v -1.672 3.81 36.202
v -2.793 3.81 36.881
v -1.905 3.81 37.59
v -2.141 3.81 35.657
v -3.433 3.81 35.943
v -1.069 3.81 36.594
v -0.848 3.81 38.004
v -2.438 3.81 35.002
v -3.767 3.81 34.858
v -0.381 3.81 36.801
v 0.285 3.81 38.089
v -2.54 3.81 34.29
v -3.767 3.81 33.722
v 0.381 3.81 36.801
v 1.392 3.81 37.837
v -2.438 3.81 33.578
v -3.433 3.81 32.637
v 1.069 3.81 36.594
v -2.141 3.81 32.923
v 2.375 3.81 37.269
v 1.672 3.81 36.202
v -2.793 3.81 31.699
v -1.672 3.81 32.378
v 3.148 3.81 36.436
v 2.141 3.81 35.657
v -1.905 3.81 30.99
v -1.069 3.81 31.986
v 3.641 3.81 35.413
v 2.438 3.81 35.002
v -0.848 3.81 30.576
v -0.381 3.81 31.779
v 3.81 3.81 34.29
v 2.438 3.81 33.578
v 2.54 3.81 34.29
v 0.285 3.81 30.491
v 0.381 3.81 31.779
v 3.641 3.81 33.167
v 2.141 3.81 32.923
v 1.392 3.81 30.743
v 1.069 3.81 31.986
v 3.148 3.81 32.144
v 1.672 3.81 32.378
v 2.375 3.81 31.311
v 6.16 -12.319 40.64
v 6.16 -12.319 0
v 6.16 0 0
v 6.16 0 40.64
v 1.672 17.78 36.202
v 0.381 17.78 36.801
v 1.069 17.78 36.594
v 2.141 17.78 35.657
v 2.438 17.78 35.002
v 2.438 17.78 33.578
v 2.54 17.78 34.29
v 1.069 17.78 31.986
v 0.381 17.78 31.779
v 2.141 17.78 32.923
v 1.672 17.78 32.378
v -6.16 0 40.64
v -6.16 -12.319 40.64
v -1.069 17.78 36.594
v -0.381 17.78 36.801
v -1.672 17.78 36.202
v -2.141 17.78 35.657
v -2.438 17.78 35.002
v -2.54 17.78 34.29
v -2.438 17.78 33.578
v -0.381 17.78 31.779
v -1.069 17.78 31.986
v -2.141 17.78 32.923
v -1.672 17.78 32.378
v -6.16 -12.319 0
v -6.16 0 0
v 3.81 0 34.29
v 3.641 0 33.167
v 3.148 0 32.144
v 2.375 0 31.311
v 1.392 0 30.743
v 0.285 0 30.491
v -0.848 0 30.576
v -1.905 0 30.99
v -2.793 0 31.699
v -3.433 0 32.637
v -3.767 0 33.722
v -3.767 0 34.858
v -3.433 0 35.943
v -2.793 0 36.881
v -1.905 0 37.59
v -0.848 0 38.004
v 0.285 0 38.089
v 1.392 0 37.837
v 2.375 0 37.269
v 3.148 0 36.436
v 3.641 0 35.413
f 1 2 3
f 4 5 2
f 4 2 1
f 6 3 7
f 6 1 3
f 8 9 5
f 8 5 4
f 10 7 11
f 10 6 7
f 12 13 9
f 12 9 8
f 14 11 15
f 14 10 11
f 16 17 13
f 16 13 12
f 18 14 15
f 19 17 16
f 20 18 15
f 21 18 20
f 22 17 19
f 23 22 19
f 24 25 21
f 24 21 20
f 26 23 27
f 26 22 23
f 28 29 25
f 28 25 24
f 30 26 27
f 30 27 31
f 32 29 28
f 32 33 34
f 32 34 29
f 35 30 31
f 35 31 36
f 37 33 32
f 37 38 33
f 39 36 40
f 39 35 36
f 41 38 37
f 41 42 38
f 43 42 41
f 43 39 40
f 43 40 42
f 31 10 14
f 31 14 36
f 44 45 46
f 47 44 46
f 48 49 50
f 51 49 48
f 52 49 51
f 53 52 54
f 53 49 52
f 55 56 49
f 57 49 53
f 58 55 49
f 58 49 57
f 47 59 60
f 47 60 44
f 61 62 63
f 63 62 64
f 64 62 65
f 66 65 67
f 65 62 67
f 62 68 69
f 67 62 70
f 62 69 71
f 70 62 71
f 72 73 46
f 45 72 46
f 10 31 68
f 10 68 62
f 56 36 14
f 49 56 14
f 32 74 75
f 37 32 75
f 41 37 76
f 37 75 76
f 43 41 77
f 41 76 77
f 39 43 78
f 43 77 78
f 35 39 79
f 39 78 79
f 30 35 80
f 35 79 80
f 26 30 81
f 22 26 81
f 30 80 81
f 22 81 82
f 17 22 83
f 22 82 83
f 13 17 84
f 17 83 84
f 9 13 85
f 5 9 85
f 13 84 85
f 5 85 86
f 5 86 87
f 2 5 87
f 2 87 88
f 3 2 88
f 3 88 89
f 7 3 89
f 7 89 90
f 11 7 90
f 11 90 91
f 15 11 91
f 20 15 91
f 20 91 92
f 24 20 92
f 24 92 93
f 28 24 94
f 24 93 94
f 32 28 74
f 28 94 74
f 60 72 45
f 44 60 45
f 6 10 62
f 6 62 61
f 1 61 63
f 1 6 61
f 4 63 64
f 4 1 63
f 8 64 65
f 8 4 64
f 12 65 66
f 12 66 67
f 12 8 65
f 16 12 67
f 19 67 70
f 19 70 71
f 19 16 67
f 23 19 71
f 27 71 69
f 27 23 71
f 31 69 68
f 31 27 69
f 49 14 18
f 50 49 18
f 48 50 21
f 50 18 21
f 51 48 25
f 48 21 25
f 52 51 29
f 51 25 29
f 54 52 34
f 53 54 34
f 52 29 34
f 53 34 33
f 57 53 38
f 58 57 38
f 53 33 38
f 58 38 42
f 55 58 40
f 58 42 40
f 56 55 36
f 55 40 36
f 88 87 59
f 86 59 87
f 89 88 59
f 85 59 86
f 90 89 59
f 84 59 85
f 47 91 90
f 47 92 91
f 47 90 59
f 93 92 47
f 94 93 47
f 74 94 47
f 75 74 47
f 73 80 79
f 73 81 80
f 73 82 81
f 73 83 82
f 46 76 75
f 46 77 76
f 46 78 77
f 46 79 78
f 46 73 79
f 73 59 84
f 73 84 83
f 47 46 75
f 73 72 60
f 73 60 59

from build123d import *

# Parameters (mm, degrees)
SKETCH1_W           = 12.319
SKETCH1_H           = 12.319
BOSS_EXTRUDE1_DEPTH = 40.64
BOSS_EXTRUDE2_DEPTH = 17.78
SKETCH3_R           = 3.81
BOSS_EXTRUDE3_DEPTH = 3.81


with BuildPart() as part:
    # Sketch1 → Boss-Extrude1 (new body)
    with BuildSketch(Plane.XY):
        with Locations((0, -6.1595)):
            Rectangle(SKETCH1_W, SKETCH1_H)
    extrude(amount=BOSS_EXTRUDE1_DEPTH)

    # Sketch2 → Boss-Extrude2 (add)
    with BuildSketch(Plane(origin=(0, 0, 0), x_dir=(1, 0, 0), z_dir=(0, 1, 0))):
        with BuildLine():
            Line((-0.381, -31.778737568), (-0.381, -36.801262432))
            ThreePointArc((-0.381, -36.801262432), (-2.54, -34.29), (-0.381, -31.778737568))
        make_face()
        with BuildLine():
            Line((0.381, -31.778737568), (0.381, -36.801262432))
            ThreePointArc((0.381, -36.801262432), (2.54, -34.29), (0.381, -31.778737568))
        make_face()
    extrude(amount=BOSS_EXTRUDE2_DEPTH)

    # Sketch3 → Boss-Extrude3 (add)
    with BuildSketch(Plane(origin=(0, 0, 0), x_dir=(1, 0, 0), z_dir=(0, 1, 0))):
        with Locations((0, -34.29)):
            Circle(SKETCH3_R)
    extrude(amount=BOSS_EXTRUDE3_DEPTH)


solid = part.part
